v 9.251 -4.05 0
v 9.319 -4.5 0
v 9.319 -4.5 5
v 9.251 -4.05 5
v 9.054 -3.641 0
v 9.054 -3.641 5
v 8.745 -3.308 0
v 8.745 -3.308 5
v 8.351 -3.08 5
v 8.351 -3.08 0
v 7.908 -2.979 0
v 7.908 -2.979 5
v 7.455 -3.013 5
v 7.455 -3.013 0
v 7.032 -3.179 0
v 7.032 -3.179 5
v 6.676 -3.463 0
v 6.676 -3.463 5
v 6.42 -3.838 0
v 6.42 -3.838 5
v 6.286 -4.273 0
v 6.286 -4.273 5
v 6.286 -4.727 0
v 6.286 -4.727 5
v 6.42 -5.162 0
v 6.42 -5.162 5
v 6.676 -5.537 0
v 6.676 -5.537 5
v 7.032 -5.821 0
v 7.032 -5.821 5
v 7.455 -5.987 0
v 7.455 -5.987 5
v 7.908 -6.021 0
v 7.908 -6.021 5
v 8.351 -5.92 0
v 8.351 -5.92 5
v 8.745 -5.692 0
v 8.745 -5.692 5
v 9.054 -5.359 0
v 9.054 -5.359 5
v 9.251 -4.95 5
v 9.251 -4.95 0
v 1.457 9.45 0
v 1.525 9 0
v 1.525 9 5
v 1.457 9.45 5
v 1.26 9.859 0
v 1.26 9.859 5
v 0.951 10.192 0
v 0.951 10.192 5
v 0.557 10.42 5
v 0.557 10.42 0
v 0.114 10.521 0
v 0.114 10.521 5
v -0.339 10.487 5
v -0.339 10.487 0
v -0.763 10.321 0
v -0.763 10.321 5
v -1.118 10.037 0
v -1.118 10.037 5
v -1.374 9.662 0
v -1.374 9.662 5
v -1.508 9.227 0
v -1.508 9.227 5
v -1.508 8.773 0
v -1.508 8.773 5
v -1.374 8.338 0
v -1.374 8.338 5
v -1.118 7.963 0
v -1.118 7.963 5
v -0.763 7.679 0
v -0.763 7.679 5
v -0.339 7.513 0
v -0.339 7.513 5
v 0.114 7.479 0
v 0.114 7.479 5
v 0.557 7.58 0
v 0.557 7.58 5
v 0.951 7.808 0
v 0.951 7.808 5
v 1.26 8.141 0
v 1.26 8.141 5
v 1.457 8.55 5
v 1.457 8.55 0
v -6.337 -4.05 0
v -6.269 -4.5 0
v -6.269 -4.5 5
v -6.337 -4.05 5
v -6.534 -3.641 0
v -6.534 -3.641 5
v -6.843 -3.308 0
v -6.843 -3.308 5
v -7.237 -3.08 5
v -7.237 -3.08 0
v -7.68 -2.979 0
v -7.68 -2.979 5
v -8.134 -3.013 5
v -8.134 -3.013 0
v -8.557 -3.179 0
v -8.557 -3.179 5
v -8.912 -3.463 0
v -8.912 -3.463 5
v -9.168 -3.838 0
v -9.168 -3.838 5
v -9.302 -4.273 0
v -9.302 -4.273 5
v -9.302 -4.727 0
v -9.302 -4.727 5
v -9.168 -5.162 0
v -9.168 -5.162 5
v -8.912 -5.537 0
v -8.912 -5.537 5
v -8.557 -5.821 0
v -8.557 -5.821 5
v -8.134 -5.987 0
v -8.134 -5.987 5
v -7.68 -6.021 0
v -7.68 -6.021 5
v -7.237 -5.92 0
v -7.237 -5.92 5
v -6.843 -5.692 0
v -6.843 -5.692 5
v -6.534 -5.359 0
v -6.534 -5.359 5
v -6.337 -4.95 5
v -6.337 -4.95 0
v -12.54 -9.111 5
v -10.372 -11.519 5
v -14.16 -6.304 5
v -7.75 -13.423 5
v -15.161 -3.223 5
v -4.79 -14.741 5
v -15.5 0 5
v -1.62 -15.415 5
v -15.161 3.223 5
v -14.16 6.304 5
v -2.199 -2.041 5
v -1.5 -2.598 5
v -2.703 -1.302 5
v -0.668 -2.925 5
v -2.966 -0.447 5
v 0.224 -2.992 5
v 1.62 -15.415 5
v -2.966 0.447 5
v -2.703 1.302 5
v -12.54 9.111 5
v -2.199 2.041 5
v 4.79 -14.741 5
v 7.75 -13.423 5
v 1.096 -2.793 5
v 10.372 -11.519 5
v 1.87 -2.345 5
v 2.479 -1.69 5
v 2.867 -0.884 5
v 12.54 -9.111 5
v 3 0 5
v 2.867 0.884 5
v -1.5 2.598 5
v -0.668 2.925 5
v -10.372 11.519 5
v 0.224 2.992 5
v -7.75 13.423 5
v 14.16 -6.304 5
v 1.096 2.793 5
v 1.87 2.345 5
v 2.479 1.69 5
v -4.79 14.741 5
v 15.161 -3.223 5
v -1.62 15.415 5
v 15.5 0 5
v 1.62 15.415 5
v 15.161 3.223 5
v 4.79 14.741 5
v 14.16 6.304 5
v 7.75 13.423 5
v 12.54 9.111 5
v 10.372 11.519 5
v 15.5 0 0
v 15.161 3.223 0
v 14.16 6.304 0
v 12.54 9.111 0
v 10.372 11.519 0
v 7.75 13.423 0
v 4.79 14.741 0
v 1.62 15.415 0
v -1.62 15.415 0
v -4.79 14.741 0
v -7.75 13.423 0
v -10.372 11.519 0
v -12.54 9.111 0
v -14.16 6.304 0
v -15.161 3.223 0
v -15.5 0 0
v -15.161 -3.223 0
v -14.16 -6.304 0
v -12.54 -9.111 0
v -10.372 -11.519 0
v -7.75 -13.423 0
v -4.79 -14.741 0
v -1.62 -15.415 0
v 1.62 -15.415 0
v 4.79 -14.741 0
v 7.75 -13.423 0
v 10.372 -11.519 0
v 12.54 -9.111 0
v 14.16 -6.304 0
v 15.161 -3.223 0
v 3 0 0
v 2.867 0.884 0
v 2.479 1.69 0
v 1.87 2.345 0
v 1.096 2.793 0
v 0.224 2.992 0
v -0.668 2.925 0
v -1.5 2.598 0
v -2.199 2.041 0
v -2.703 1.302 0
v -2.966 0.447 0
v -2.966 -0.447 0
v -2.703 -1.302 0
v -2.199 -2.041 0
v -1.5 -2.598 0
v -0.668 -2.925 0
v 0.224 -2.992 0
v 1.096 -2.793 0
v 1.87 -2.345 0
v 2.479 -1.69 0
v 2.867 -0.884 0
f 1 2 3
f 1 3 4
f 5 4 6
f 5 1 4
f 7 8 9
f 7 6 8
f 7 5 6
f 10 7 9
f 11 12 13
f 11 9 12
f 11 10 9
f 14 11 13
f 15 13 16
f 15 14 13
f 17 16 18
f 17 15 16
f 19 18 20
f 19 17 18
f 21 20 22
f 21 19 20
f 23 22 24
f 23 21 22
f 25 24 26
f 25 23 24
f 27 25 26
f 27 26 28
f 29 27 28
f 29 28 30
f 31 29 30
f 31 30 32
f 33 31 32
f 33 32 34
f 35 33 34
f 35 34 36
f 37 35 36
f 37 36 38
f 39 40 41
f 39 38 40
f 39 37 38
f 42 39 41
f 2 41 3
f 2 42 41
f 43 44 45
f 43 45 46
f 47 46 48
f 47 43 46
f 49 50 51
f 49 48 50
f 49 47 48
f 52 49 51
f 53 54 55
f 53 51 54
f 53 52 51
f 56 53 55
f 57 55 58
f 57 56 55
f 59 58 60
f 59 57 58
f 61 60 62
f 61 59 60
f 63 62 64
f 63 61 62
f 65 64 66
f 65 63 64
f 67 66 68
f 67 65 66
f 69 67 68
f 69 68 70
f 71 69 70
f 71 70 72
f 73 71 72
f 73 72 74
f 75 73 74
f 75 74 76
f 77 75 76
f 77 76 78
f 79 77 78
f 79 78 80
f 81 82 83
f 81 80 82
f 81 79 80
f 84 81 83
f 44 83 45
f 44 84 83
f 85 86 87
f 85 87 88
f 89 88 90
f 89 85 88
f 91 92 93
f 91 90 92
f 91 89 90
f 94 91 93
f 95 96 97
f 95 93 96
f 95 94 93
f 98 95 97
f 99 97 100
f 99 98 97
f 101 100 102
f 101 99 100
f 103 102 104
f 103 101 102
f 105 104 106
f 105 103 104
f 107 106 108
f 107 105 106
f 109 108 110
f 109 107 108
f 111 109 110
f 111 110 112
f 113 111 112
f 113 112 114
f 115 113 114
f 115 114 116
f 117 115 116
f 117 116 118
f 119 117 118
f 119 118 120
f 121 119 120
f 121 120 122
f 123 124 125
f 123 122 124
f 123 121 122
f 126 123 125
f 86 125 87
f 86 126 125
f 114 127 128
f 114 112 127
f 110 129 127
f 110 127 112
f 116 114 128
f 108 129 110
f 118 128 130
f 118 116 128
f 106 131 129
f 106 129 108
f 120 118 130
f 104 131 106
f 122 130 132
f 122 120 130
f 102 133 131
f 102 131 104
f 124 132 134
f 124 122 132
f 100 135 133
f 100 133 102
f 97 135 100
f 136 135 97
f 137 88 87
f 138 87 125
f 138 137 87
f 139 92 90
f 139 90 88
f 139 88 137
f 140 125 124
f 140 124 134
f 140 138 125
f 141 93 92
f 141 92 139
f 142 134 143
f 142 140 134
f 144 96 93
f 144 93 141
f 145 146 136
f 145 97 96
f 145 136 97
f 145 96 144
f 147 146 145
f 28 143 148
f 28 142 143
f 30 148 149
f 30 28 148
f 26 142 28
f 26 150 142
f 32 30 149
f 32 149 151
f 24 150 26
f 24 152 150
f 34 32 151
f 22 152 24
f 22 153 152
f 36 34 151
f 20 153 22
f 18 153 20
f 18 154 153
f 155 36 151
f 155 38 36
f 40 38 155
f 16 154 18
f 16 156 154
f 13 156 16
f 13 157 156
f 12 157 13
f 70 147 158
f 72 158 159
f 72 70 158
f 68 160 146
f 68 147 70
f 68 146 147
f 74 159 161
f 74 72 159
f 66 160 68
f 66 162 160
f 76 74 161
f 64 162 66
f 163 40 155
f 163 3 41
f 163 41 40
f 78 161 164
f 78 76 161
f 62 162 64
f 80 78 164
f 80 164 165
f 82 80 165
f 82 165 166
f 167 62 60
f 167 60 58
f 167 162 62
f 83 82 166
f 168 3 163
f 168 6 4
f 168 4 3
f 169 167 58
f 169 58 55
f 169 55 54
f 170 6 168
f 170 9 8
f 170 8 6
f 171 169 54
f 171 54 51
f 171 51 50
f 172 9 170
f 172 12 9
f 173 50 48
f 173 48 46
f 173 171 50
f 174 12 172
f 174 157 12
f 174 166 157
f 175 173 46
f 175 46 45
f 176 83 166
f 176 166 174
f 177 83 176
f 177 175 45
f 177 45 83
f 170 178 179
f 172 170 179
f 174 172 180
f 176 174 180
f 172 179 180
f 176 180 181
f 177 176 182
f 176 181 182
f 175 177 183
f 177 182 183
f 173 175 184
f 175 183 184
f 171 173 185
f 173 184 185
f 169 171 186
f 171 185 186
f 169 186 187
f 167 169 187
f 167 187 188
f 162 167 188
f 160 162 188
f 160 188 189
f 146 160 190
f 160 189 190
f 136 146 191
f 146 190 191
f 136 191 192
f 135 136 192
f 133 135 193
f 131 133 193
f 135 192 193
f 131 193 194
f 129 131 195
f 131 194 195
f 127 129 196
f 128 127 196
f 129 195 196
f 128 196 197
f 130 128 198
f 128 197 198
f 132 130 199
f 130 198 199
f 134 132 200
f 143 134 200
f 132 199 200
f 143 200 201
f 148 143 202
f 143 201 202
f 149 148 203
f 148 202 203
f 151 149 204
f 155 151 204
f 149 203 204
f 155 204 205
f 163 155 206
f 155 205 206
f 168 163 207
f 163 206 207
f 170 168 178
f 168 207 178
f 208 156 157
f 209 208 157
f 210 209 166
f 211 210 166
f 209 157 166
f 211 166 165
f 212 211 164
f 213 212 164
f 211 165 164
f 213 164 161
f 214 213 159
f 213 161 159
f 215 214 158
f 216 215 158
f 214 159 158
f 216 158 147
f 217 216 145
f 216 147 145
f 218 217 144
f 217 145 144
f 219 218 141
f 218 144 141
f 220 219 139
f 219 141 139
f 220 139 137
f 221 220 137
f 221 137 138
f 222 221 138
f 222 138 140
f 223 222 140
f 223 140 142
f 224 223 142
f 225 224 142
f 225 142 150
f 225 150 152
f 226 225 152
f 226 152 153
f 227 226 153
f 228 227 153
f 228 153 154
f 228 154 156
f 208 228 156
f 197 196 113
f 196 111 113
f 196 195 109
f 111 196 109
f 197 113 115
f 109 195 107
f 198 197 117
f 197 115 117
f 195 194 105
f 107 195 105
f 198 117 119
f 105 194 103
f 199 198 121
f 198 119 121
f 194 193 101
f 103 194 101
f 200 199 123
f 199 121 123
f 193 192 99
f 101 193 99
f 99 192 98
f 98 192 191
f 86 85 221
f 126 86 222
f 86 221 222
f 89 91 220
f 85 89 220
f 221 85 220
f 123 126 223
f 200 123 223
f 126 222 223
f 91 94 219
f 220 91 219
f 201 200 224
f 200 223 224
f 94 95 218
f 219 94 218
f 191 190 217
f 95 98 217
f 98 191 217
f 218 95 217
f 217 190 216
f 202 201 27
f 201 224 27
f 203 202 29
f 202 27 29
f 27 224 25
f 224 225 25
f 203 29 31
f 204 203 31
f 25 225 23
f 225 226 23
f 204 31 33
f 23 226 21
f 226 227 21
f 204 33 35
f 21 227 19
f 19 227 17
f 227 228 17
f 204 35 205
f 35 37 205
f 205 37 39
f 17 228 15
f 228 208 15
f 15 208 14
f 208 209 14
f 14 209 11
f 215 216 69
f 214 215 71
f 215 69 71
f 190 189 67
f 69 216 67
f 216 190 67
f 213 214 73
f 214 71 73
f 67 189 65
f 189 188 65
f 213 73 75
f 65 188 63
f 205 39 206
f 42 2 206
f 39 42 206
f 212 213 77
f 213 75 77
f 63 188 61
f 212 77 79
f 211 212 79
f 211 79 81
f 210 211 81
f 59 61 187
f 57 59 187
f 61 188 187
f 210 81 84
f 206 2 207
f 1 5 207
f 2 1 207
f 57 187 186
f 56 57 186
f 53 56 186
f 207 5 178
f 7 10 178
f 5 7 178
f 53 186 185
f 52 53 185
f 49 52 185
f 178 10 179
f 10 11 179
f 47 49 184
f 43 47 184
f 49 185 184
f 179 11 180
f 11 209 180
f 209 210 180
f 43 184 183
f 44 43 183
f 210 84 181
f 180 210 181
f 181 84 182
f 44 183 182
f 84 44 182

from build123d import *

# Parameters (mm, degrees)
SKETCH1_R               = 15.5
BOSS_EXTRUDE1_DEPTH     = 5
CUT_EXTRUDE1_REACH      = 24.483
SKETCH2_R               = 3
CUT_EXTRUDE2_DEPTH      = 23.483327156
CUT_EXTRUDE2_DEPTH_BACK = 23.483327156
SKETCH3_R               = 1.525


with BuildPart() as part:
    # Sketch1 → Boss-Extrude1 (new body)
    with BuildSketch(Plane.XY):
        Circle(SKETCH1_R)
    extrude(amount=BOSS_EXTRUDE1_DEPTH)

    # Sketch2 → Cut-Extrude1 (cut, up to next)
    with BuildSketch(Plane.XY.offset(5), mode=Mode.PRIVATE) as cut_extrude1_sk1:
        Circle(SKETCH2_R)
    cut_extrude1_tool1 = extrude(cut_extrude1_sk1.sketch, amount=-CUT_EXTRUDE1_REACH, mode=Mode.PRIVATE) & part.part
    add(cut_extrude1_tool1.solids().sort_by_distance((0, 0, 5))[0], mode=Mode.SUBTRACT)

    # Sketch3 → Cut-Extrude2 (cut, two sides: drawn at the far end of the back side and taken through both)
    with BuildSketch(Plane.XY.offset(5).offset(-CUT_EXTRUDE2_DEPTH_BACK)):
        with Locations((0, 9)):
            Circle(SKETCH3_R)
        with Locations((7.794228634, -4.5)):
            Circle(SKETCH3_R)
        with Locations((-7.794228634, -4.5)):
            Circle(SKETCH3_R)
    extrude(amount=CUT_EXTRUDE2_DEPTH + CUT_EXTRUDE2_DEPTH_BACK, mode=Mode.SUBTRACT)


solid = part.part
